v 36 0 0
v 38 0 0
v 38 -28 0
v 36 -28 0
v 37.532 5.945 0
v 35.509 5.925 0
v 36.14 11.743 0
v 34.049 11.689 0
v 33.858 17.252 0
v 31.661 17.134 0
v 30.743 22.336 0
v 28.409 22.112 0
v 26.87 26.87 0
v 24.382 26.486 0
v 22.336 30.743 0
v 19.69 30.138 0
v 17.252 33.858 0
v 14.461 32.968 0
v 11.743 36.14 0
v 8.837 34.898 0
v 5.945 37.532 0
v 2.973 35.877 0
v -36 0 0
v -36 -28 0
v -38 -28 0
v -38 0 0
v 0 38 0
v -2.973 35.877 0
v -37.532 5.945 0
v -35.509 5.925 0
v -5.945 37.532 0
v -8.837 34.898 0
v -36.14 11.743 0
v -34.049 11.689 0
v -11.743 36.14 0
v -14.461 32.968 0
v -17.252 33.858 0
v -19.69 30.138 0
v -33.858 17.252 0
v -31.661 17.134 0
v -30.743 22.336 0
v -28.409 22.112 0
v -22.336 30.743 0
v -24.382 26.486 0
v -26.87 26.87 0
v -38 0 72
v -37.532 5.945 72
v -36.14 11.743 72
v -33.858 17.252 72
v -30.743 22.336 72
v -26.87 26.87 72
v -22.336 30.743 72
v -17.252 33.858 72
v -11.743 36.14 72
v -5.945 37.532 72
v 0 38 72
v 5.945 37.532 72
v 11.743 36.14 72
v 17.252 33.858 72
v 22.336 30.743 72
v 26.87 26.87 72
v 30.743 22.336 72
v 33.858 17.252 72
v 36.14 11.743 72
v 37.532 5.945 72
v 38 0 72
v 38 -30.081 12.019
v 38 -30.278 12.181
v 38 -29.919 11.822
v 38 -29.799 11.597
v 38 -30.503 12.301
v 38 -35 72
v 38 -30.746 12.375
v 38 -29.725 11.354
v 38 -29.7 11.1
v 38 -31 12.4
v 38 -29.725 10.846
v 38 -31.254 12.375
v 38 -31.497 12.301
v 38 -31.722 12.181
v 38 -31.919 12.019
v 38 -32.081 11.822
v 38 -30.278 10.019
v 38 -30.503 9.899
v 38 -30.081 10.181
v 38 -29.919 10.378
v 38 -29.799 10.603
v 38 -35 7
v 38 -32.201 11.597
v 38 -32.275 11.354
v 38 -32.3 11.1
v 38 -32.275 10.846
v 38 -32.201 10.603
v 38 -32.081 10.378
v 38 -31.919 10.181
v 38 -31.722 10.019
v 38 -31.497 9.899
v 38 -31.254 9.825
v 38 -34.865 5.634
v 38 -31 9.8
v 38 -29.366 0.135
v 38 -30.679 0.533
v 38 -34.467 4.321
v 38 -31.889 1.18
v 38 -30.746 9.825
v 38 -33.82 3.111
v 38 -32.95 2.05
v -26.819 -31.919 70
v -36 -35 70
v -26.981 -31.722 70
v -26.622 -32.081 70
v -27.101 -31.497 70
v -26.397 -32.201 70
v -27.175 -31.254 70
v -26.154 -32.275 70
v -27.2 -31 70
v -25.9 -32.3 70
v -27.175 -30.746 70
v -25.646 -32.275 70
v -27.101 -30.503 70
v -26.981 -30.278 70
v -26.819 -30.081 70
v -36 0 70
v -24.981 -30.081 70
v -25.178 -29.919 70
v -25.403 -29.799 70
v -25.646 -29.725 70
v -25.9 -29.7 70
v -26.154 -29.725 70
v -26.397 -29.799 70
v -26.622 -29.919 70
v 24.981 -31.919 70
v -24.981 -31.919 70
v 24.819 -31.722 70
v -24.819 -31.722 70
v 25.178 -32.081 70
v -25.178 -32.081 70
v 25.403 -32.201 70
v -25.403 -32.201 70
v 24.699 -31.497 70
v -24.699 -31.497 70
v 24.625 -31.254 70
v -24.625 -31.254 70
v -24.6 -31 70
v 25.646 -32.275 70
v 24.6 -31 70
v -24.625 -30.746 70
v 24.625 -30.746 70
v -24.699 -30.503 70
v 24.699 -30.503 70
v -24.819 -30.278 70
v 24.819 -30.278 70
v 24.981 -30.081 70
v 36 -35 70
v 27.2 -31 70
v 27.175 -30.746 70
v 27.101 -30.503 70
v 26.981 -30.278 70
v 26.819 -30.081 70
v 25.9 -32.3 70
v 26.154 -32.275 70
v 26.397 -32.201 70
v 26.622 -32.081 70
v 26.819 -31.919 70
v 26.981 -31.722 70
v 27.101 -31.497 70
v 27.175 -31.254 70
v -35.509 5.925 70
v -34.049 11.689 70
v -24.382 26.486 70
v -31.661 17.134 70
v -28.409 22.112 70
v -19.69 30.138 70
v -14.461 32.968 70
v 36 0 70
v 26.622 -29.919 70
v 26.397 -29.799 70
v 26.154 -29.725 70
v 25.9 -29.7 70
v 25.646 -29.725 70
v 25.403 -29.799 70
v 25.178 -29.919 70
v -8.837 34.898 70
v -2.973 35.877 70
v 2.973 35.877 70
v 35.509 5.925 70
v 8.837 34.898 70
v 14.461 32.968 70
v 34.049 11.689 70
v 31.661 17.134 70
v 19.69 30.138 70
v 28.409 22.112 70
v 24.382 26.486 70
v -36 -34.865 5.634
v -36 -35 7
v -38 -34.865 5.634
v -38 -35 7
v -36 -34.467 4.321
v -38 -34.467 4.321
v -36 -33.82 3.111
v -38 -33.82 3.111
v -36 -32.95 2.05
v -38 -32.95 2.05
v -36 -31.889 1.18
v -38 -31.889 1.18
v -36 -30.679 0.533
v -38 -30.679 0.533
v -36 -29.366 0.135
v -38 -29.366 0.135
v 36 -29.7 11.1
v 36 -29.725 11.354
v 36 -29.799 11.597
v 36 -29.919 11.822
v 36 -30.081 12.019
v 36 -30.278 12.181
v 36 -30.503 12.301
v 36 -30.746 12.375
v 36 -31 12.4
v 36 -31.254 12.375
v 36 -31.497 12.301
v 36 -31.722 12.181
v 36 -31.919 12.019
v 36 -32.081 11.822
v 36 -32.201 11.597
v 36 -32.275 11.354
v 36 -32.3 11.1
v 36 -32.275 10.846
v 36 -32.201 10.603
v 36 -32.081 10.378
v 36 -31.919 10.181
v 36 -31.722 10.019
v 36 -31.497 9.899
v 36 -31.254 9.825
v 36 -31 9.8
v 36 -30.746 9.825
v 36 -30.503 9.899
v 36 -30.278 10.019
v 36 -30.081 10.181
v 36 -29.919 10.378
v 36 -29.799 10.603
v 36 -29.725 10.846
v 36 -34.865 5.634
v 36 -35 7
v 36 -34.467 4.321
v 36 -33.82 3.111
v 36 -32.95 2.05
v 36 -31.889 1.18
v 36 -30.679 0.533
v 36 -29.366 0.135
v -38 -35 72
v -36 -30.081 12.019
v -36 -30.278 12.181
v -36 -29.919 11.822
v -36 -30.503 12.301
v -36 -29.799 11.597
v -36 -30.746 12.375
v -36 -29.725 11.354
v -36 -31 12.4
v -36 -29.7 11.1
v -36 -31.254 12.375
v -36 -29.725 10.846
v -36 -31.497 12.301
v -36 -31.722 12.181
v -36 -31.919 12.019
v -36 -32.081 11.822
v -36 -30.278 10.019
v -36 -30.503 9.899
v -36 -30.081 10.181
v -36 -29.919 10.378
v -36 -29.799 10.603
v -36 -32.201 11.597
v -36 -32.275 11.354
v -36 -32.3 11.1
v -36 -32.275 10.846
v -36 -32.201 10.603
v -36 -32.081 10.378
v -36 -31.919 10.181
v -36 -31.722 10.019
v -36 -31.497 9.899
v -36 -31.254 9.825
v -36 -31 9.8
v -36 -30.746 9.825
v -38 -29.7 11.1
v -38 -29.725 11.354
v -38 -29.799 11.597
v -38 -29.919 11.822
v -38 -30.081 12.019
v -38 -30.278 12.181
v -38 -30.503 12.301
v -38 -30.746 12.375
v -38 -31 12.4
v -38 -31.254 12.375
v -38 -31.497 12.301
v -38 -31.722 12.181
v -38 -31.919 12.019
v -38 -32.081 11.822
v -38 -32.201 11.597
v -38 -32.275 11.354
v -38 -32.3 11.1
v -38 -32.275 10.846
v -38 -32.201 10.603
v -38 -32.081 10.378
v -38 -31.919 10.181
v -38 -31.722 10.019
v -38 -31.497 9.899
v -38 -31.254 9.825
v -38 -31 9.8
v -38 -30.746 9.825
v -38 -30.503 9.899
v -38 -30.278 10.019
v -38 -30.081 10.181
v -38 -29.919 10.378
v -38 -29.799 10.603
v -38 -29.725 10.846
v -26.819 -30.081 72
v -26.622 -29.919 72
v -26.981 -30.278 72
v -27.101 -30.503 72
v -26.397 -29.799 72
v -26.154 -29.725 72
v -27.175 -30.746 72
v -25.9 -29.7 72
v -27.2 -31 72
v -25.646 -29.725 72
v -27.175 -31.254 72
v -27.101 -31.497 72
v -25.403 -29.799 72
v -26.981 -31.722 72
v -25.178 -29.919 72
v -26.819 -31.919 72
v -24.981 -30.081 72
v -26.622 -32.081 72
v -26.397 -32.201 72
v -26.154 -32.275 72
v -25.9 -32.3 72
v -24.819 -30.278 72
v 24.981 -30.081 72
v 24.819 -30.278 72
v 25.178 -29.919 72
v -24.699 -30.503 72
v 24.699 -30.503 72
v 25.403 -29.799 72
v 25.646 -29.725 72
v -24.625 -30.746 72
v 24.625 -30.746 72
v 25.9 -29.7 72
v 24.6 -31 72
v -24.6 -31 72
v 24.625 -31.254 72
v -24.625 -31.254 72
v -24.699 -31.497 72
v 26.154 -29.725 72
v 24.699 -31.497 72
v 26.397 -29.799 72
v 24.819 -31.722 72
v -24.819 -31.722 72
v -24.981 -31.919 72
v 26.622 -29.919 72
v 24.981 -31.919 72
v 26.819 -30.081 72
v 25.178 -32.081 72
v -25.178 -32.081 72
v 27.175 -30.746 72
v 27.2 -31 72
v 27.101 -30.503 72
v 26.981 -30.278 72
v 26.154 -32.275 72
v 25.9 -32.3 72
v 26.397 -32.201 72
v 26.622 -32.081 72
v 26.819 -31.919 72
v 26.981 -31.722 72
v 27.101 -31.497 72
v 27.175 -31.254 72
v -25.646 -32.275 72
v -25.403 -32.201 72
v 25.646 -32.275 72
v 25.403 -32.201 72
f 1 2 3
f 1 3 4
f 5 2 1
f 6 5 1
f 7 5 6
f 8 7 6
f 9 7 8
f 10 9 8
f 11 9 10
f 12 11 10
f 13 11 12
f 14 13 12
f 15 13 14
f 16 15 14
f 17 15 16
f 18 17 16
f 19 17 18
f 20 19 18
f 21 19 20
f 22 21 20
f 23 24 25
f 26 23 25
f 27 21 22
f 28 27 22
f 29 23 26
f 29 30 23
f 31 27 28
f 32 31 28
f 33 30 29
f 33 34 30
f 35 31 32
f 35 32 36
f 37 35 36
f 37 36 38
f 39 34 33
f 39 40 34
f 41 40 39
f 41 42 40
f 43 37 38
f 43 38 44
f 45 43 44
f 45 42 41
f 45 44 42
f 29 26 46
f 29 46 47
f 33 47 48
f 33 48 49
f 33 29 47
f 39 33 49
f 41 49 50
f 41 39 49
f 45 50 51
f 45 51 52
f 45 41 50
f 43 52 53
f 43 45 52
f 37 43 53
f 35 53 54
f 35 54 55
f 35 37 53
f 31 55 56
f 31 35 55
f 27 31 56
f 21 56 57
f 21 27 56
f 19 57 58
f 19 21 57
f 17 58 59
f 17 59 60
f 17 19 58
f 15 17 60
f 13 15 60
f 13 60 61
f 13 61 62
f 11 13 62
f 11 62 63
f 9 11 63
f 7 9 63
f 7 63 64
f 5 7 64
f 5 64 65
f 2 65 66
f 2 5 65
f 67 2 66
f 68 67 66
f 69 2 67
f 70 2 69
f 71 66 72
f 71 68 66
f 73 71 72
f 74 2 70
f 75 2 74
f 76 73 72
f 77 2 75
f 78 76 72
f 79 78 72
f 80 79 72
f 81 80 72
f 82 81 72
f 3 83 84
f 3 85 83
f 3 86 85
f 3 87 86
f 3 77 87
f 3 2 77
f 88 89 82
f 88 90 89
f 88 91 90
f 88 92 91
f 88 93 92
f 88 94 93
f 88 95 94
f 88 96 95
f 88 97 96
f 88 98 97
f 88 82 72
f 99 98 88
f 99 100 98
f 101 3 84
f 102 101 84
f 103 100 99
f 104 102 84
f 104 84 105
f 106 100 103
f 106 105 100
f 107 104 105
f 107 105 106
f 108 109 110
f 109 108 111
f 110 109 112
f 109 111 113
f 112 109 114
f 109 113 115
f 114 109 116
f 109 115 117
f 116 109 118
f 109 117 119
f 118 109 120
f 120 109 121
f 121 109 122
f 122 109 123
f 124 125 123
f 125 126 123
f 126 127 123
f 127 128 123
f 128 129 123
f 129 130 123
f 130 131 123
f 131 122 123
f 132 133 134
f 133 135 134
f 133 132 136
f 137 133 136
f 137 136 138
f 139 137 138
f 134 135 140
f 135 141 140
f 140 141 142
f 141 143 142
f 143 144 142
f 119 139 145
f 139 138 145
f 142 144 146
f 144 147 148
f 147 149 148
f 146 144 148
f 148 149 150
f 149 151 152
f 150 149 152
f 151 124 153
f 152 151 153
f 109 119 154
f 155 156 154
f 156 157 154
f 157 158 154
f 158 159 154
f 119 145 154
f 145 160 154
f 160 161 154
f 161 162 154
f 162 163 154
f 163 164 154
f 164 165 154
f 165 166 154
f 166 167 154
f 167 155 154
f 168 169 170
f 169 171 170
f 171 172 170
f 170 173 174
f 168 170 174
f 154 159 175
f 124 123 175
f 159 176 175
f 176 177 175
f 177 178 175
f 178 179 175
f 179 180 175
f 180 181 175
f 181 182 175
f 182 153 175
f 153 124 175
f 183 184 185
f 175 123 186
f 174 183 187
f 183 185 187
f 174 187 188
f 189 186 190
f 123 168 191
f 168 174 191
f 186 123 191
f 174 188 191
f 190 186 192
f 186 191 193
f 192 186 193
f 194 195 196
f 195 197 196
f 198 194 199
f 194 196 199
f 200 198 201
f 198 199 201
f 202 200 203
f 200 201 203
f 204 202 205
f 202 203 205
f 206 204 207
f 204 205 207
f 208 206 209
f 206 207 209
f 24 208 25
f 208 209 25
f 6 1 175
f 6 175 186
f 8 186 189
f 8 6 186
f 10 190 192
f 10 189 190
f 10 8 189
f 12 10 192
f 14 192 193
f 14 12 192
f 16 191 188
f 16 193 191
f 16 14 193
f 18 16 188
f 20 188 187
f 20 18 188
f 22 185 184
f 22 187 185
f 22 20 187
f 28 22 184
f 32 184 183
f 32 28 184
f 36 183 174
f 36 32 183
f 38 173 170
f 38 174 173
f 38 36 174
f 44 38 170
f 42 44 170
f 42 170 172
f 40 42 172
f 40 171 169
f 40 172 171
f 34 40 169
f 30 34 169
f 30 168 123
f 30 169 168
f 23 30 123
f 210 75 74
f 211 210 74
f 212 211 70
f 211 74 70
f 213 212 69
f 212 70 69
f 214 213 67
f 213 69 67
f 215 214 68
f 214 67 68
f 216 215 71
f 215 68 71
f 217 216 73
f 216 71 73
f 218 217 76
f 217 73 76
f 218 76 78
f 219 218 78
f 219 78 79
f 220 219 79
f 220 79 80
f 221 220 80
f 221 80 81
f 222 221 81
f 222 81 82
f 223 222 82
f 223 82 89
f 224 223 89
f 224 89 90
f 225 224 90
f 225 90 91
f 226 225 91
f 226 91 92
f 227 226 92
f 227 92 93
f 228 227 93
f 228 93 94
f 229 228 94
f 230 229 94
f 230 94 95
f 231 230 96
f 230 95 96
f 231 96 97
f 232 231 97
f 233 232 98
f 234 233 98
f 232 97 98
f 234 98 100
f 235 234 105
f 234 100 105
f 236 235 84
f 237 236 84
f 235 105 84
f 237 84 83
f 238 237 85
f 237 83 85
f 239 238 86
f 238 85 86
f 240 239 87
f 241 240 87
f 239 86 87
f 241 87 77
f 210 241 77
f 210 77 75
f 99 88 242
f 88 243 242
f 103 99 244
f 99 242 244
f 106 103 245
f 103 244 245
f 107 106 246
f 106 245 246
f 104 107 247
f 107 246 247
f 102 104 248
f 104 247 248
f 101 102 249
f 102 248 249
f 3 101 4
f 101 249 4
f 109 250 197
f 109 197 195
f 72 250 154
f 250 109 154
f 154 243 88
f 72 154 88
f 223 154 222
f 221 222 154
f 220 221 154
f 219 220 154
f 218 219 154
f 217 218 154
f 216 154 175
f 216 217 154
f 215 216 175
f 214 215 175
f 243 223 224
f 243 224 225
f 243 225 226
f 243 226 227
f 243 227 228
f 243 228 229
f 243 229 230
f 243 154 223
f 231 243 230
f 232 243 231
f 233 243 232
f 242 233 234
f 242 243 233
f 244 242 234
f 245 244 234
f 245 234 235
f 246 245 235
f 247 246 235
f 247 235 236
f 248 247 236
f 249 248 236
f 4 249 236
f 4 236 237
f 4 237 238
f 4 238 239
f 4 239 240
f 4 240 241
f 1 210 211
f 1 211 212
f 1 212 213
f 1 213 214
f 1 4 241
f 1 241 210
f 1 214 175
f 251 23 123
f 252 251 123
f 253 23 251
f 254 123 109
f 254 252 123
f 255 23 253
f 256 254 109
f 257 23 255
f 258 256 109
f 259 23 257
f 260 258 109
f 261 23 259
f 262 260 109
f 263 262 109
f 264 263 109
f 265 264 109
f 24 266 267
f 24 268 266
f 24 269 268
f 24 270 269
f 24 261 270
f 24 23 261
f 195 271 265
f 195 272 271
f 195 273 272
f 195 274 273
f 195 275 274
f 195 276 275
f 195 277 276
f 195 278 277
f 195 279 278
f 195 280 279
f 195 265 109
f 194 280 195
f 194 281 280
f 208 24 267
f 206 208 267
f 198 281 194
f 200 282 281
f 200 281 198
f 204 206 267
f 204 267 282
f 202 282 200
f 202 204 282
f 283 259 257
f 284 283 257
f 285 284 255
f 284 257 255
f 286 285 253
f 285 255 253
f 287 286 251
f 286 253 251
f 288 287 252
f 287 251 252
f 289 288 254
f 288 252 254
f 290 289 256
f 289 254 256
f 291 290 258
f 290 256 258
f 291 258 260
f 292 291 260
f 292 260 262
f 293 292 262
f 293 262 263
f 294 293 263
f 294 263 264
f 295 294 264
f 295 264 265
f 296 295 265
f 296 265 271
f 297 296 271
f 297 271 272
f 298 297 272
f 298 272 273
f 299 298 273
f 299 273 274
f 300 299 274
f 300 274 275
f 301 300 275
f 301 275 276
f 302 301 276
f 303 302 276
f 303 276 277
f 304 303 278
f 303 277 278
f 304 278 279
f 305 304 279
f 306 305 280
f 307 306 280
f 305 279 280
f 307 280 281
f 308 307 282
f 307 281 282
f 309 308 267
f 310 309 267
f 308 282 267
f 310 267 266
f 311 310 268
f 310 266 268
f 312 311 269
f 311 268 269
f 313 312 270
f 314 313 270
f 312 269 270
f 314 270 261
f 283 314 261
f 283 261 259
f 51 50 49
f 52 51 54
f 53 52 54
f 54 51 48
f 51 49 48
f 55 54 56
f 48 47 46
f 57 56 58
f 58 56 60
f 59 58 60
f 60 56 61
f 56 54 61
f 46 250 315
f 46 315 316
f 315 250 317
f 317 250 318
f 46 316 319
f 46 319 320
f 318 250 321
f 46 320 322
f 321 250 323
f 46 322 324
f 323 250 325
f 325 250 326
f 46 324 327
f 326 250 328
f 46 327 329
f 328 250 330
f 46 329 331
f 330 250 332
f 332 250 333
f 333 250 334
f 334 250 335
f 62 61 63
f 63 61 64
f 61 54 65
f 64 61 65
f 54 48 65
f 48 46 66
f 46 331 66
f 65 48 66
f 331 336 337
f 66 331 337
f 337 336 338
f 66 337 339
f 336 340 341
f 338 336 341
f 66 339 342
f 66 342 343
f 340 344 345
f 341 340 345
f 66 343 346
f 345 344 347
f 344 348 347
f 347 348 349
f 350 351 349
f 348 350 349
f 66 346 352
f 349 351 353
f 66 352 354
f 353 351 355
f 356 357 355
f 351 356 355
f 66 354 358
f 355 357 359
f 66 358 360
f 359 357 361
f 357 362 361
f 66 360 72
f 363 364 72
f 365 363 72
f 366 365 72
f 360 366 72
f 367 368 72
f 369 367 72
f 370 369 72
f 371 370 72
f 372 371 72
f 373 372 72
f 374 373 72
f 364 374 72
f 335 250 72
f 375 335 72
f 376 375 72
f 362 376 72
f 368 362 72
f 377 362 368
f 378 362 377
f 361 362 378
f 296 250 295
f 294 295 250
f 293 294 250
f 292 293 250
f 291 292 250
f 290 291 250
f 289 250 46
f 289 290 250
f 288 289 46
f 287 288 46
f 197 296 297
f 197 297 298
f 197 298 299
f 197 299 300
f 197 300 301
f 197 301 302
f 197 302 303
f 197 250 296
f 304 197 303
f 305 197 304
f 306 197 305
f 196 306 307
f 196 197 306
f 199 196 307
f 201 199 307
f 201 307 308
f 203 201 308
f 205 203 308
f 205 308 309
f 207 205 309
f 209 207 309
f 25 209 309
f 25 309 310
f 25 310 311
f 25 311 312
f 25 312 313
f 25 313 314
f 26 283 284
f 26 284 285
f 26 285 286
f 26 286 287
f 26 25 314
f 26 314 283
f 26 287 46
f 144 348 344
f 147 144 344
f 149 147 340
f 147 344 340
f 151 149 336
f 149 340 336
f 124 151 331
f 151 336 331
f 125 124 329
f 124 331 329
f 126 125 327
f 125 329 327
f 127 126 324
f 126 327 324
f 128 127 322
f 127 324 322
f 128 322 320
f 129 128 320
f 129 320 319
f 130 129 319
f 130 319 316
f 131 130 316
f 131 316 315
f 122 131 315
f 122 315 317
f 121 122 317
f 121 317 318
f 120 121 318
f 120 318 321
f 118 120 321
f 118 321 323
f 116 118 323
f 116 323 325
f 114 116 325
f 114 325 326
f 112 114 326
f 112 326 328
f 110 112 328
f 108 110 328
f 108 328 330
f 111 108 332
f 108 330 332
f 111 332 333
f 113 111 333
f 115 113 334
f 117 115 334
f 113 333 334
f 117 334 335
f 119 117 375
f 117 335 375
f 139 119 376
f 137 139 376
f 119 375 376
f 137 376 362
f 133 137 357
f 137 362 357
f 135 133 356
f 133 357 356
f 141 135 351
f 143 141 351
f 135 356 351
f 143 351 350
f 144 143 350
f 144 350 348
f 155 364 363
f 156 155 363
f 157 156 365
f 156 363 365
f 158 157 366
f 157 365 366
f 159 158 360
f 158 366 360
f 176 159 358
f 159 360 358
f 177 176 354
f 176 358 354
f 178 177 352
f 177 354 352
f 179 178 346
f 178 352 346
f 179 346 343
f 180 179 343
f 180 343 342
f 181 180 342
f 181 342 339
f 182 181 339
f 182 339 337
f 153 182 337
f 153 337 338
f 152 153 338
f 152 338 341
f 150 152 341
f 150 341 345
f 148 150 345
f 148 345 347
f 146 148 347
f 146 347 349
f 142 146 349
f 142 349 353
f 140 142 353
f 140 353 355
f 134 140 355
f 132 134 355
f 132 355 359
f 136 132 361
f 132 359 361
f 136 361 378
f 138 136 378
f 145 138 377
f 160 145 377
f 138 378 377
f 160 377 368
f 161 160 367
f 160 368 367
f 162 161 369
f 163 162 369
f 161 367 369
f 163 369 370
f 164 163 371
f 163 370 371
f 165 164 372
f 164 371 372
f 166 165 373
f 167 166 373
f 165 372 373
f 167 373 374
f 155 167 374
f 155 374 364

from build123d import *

# Parameters (mm, degrees)
BOSS_EXTRUDE1_DEPTH                  = 72
SKETCH2_W                            = 72
SKETCH2_H                            = 2
BOSS_EXTRUDE2_DEPTH                  = 35
BOSS_EXTRUDE2_DIRECTION_2_REACH      = 91.844
BOSS_EXTRUDE2_DIRECTION_2_END_RADIUS = 36
SKETCH3_R                            = 1.3
CUT_EXTRUDE1_DEPTH                   = 10
SKETCH4_R                            = 1.3
CUT_EXTRUDE2_DEPTH                   = 112.373246339
FILLET1_R                            = 7


with BuildPart() as part:
    # Sketch1 → Boss-Extrude1 (new body)
    with BuildSketch(Plane.XY):
        with BuildLine():
            Line((-36, 0), (-36, -35))
            Line((-36, -35), (-38, -35))
            Line((-38, -35), (-38, 0))
            ThreePointArc((-38, 0), (0, 38), (38, 0))
            Line((38, 0), (38, -35))
            Line((38, -35), (36, -35))
            Line((36, -35), (36, 0))
            ThreePointArc((36, 0), (0, 36), (-36, 0))
        make_face()
    extrude(amount=BOSS_EXTRUDE1_DEPTH)

    # Sketch2 → Boss-Extrude2 (add)
    with BuildSketch(Plane(origin=(0, 0, 0), x_dir=(1, 0, 0), z_dir=(0, 1, 0))):
        with Locations((0, -71)):
            Rectangle(SKETCH2_W, SKETCH2_H)
    extrude(amount=-BOSS_EXTRUDE2_DEPTH)

    # Boss-Extrude2 direction 2: up to this cylinder (the profile starts inside it)
    boss_extrude2_direction_2_end = Plane(origin=(0, 0, 71), z_dir=(0, 0, -1)) * Cylinder(BOSS_EXTRUDE2_DIRECTION_2_END_RADIUS, 256.688, mode=Mode.PRIVATE)
    # Sketch2 → Boss-Extrude2 direction 2 (add, up to the surface)
    with BuildSketch(Plane(origin=(0, 0, 0), x_dir=(1, 0, 0), z_dir=(0, 1, 0)), mode=Mode.PRIVATE) as boss_extrude2_direction_2_sk1:
        with Locations((0, -71)):
            Rectangle(SKETCH2_W, SKETCH2_H)
    boss_extrude2_direction_2_tool1 = extrude(boss_extrude2_direction_2_sk1.sketch, amount=BOSS_EXTRUDE2_DIRECTION_2_REACH, mode=Mode.PRIVATE) & boss_extrude2_direction_2_end
    add(boss_extrude2_direction_2_tool1.solids().sort_by_distance((0, 0, 71))[0])

    # Sketch3 → Cut-Extrude1 (cut)
    with BuildSketch(Plane.XY.offset(72)):
        with Locations((-25.9, -31)):
            Circle(SKETCH3_R)
        with Locations((25.9, -31)):
            Circle(SKETCH3_R)
    extrude(amount=-CUT_EXTRUDE1_DEPTH, mode=Mode.SUBTRACT)

    # Sketch4 → Cut-Extrude2 (cut, through all)
    with BuildSketch(Plane(origin=(38, 0, 0), x_dir=(0, 0, -1), z_dir=(1, 0, 0))):
        with Locations(Location((-11.1, -31, 0), (0, 0, 90))):
            Circle(SKETCH4_R)
    extrude(amount=-CUT_EXTRUDE2_DEPTH, mode=Mode.SUBTRACT)

    # Fillet1
    fillet1_edges = [part.edges().sort_by_distance(p)[0] for p in [
        (-37, -35, 0),
        (37, -35, 0),
    ]]
    fillet(fillet1_edges, radius=FILLET1_R)


solid = part.part
